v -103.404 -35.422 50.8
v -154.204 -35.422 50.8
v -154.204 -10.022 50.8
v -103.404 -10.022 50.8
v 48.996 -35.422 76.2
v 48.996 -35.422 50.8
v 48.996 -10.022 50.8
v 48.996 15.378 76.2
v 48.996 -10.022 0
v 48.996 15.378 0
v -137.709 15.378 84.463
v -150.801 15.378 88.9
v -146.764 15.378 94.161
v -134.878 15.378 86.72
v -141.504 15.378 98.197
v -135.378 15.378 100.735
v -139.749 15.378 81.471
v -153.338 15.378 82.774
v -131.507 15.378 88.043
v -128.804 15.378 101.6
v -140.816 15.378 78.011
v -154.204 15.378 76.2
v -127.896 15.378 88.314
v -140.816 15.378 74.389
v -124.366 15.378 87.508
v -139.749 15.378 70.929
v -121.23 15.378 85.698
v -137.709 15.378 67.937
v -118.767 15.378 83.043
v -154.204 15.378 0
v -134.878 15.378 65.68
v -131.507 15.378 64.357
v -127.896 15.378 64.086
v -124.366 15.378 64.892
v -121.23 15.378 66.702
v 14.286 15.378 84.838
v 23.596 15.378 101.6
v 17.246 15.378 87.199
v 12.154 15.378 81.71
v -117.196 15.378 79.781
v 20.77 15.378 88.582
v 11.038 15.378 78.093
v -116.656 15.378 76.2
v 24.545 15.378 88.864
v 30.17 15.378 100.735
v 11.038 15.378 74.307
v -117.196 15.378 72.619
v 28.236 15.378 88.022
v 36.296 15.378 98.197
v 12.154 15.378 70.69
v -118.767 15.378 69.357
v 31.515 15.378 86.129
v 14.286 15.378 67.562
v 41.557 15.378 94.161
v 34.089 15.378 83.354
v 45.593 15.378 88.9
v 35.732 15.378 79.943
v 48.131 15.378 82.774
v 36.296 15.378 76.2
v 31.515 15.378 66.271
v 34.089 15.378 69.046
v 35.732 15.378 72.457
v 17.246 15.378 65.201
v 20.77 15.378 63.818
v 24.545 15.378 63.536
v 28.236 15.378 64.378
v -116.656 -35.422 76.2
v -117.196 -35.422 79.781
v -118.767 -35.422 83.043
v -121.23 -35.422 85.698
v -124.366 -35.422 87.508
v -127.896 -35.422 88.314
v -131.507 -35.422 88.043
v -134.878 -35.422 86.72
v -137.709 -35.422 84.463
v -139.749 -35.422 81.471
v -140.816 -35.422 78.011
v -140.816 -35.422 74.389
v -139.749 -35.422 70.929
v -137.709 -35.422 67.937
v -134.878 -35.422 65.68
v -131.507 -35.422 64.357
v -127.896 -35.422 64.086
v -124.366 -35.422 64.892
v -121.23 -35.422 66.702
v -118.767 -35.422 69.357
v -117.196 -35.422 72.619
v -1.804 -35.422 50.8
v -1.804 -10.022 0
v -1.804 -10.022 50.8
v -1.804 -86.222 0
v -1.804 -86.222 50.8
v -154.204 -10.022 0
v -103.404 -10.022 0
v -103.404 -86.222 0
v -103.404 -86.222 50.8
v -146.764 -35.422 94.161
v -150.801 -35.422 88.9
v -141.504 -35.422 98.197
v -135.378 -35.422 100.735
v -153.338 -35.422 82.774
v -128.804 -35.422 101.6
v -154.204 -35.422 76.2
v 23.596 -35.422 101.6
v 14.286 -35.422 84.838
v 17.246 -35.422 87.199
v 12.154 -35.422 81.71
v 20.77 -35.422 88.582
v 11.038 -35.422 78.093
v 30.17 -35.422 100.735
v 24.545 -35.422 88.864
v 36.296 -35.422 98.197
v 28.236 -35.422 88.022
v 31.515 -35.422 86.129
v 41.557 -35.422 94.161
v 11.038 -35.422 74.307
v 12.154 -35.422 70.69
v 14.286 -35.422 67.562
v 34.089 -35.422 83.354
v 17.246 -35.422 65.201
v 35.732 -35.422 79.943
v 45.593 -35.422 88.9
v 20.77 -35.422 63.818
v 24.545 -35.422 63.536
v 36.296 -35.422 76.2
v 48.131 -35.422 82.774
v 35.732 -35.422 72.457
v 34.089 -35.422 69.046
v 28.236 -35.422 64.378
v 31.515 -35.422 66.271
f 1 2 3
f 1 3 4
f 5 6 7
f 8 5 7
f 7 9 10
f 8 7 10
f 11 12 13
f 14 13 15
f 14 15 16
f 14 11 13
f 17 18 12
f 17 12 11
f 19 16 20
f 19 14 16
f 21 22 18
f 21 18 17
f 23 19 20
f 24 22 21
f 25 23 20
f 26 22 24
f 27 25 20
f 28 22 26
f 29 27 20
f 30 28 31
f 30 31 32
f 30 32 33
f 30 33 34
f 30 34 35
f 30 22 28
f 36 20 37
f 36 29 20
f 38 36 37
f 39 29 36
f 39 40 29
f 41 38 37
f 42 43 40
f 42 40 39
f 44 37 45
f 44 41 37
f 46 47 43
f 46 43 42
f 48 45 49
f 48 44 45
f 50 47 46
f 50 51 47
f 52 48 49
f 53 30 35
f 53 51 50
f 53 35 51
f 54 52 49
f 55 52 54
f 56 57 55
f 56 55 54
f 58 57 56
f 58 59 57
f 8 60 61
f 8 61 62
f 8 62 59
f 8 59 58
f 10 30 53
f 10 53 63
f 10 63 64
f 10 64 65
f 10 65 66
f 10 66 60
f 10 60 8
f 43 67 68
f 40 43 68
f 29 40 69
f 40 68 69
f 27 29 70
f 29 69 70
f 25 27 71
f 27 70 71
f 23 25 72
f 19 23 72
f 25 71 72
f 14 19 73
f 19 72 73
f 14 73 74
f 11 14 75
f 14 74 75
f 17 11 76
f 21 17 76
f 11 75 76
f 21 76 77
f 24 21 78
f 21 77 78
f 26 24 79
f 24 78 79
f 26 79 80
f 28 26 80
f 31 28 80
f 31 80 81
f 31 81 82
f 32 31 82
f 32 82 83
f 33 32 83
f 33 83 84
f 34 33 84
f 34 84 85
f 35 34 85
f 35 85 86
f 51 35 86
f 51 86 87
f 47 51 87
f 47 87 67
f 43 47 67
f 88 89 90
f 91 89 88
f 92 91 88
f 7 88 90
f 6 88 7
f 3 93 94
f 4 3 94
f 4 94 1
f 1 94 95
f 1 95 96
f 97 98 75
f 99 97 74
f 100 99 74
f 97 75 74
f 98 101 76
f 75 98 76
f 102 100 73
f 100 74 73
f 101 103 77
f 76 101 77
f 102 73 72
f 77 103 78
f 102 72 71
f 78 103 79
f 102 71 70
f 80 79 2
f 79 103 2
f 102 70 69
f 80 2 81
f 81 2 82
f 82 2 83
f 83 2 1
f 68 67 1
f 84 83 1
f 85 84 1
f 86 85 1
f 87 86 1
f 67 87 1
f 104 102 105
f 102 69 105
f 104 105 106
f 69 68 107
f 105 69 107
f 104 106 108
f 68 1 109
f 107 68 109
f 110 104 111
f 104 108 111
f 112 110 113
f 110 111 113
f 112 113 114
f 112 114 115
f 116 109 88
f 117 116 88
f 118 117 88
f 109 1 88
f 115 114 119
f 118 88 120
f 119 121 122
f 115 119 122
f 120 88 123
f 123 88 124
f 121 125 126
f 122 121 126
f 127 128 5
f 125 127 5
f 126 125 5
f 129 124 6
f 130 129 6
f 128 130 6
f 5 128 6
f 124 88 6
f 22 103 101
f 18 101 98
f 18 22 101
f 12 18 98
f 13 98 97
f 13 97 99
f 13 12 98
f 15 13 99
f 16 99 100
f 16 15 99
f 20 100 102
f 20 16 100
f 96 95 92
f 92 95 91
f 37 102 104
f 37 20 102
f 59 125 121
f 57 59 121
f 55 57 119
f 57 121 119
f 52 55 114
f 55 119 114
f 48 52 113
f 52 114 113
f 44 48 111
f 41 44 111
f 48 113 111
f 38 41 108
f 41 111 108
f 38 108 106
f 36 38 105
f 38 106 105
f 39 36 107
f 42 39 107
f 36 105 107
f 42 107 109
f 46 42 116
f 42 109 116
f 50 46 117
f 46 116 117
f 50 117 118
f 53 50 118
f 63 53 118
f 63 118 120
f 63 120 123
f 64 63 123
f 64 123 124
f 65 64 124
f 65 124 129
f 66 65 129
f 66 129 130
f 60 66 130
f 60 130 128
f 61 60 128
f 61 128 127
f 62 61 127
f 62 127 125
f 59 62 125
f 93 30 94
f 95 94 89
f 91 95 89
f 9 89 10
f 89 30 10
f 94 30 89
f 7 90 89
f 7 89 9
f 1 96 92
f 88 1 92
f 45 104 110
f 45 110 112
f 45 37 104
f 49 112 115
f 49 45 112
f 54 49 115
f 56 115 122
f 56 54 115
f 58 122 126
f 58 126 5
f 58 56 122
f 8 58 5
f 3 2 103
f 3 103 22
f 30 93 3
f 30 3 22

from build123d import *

# Parameters (mm, degrees)
F0_W      = 203.2
F0_H      = 101.6
F1_DEPTH  = 76.2
F2_W      = 50.8
F2_H      = 50.8
F3_DEPTH  = 76.2
F4_W      = 50.8
F4_H      = 25.4
F5_DEPTH  = 50.8
F6_W      = 152.4
F6_H      = 25.4
F7_DEPTH  = 50.8
F8_W      = 50.8
F8_H      = 50.8
F9_DEPTH  = 76.2
F10_W     = 203.2
F10_H     = 50.8
F11_DEPTH = 25.4
F12_R     = 25.4
F13_R     = 25.4
F14_R     = 12.147807
F15_DEPTH = 76.2
F16_R     = 12.7
F17_DEPTH = 50.801


with BuildPart() as f1:
    # F0 (on Top) → F1 (new body)
    with BuildSketch(Plane.XY):
        with Locations((-52.603766, -35.422396)):
            Rectangle(F0_W, F0_H)
    extrude(amount=F1_DEPTH)

    # F2 (on face) → F3 (cut)
    with BuildSketch(Plane.XZ.offset(86.222396)):
        with Locations((23.596234, 25.4)):
            Rectangle(F2_W, F2_H)
    extrude(amount=-F3_DEPTH, mode=Mode.SUBTRACT)

    # F4 (on face) → F5 (cut)
    with BuildSketch(Plane.XZ.offset(86.222396)):
        with Locations((23.596234, 63.5)):
            Rectangle(F4_W, F4_H)
    extrude(amount=-F5_DEPTH, mode=Mode.SUBTRACT)

    # F6 (on face) → F7 (cut)
    with BuildSketch(Plane.XZ.offset(86.222396)):
        with Locations((-78.003766, 63.5)):
            Rectangle(F6_W, F6_H)
    extrude(amount=-F7_DEPTH, mode=Mode.SUBTRACT)

    # F8 (on face) → F9 (cut)
    with BuildSketch(Plane.XZ.offset(86.222396)):
        with Locations((-128.803766, 25.4)):
            Rectangle(F8_W, F8_H)
    extrude(amount=-F9_DEPTH, mode=Mode.SUBTRACT)

    # F10 (on face) → F11 (join)
    with BuildSketch(Plane.XY.offset(76.2)):
        with Locations((-52.603766, -10.022396)):
            Rectangle(F10_W, F10_H)
    extrude(amount=F11_DEPTH)

    # F12
    f12_edges = [f1.edges().sort_by_distance(p)[0] for p in [
        (-154.203766, -10.022396, 101.6),
    ]]
    fillet(f12_edges, radius=F12_R)

    # F13
    f13_edges = [f1.edges().sort_by_distance(p)[0] for p in [
        (48.996234, -10.022396, 101.6),
    ]]
    fillet(f13_edges, radius=F13_R)

    # F14 (on face) → F15 (cut)
    with BuildSketch(Plane.XZ.offset(35.422396)):
        with Locations((-128.803766, 76.2)):
            Circle(F14_R)
    extrude(amount=-F15_DEPTH, mode=Mode.SUBTRACT)

    # F16 (on face) → F17 (cut, through all)
    with BuildSketch(Plane.XZ.offset(35.422396)):
        with Locations((23.596234, 76.2)):
            Circle(F16_R)
    extrude(amount=-F17_DEPTH, mode=Mode.SUBTRACT)


solid = f1.part
